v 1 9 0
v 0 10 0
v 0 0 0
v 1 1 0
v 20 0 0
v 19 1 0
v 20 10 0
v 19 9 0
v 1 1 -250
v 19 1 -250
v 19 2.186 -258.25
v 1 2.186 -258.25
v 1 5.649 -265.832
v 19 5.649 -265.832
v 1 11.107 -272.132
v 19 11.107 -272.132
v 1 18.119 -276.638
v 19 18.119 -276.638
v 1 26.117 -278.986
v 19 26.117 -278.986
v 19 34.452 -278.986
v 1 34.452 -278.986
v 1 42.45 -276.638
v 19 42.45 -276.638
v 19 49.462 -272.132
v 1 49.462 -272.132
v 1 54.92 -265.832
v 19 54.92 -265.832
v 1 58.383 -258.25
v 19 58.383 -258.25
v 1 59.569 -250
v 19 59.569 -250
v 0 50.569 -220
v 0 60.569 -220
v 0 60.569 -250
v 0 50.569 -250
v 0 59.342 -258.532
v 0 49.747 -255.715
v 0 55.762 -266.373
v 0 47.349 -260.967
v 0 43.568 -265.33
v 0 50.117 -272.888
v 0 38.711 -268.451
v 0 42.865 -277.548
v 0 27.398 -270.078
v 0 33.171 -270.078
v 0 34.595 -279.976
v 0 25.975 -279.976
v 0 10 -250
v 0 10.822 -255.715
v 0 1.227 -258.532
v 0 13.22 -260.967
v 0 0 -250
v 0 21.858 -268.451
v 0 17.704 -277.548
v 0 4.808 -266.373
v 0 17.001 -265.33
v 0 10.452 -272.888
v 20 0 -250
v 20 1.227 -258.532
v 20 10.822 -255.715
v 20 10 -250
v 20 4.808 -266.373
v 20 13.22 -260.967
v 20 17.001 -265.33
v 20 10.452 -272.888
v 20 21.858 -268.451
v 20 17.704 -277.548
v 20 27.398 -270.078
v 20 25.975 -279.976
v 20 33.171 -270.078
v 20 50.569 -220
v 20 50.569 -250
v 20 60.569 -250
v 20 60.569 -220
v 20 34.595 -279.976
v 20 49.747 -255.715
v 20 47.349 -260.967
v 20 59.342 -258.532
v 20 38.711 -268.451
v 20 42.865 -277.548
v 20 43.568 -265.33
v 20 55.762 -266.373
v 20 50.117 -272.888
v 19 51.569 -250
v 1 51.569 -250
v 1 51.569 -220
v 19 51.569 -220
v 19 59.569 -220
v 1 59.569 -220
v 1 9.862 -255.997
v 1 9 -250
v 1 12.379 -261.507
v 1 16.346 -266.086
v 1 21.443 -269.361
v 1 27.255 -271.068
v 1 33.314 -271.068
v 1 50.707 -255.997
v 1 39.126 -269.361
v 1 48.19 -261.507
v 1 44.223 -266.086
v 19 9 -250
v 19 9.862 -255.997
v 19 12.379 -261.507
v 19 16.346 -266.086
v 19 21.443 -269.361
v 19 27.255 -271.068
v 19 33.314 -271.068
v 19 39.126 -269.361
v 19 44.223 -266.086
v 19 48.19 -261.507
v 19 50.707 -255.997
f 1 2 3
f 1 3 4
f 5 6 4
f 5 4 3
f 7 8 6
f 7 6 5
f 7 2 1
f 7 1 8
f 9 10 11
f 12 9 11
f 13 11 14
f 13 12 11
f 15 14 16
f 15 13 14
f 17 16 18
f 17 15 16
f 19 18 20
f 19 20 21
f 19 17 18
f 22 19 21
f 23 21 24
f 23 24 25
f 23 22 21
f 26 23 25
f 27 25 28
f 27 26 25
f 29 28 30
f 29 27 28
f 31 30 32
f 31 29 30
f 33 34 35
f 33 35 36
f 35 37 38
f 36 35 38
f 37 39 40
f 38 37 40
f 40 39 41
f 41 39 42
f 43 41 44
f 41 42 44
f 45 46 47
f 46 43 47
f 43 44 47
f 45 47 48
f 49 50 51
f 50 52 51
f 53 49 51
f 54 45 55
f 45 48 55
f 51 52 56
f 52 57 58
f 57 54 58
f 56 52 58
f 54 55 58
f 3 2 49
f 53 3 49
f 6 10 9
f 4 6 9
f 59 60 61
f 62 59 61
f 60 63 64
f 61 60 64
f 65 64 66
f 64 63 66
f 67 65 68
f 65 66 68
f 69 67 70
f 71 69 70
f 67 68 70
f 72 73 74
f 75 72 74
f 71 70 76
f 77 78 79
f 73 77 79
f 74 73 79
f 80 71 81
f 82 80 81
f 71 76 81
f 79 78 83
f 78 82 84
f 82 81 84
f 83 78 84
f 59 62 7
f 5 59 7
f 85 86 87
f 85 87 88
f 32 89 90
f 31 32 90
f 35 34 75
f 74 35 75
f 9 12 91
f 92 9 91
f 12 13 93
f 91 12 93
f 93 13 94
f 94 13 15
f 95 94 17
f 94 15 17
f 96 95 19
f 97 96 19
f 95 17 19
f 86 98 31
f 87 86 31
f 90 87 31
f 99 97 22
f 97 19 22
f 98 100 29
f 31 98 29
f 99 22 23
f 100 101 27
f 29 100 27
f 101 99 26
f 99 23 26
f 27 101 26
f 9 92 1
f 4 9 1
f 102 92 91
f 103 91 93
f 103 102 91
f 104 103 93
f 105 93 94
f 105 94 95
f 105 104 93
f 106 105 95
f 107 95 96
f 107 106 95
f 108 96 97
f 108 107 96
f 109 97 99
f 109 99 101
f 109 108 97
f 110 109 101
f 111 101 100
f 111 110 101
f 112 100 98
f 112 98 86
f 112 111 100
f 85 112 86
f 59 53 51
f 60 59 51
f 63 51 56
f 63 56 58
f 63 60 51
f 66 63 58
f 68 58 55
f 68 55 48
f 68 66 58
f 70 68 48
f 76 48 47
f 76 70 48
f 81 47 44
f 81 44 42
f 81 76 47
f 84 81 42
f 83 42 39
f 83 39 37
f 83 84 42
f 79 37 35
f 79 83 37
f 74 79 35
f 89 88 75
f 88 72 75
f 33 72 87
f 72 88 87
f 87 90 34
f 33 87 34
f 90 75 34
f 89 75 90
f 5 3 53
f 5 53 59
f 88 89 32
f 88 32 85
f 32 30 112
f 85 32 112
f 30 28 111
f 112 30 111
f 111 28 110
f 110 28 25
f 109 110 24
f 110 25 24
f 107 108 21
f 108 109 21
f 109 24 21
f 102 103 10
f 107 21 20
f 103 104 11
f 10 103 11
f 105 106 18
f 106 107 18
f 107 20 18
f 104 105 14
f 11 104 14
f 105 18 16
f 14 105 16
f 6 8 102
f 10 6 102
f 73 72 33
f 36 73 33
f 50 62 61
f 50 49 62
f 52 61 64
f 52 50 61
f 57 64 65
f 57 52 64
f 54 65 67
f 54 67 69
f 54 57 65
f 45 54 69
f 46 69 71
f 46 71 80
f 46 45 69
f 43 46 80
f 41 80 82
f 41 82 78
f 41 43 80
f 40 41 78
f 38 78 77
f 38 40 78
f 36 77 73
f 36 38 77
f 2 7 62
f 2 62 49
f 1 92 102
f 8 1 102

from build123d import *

# Parameters (mm, degrees)
ESQUISSE1_W   = 20
ESQUISSE1_H   = 10
ESQUISSE1_W_2 = 18
ESQUISSE1_H_2 = 8


with BuildPart() as part:
    # Balayage1: sweep along a path in Esquisse2
    with BuildLine(Plane(origin=(0, 0, 0), x_dir=(0, 0, -1), z_dir=(1, 0, 0))) as balayage1_path:
        Line((0, 2.284569244), (250, 2.284569244))
        ThreePointArc((250, 2.284569244), (278, 30.284569244), (250, 58.284569244))
        Line((250, 58.284569244), (220, 58.284569244))
    # Esquisse1 → Balayage1 (sweep)
    with BuildSketch(Plane.XY):
        with Locations((10, 5)):
            Rectangle(ESQUISSE1_W, ESQUISSE1_H)
        with Locations((10, 5)):
            Rectangle(ESQUISSE1_W_2, ESQUISSE1_H_2, mode=Mode.SUBTRACT)
    sweep(path=balayage1_path.line)


solid = part.part
